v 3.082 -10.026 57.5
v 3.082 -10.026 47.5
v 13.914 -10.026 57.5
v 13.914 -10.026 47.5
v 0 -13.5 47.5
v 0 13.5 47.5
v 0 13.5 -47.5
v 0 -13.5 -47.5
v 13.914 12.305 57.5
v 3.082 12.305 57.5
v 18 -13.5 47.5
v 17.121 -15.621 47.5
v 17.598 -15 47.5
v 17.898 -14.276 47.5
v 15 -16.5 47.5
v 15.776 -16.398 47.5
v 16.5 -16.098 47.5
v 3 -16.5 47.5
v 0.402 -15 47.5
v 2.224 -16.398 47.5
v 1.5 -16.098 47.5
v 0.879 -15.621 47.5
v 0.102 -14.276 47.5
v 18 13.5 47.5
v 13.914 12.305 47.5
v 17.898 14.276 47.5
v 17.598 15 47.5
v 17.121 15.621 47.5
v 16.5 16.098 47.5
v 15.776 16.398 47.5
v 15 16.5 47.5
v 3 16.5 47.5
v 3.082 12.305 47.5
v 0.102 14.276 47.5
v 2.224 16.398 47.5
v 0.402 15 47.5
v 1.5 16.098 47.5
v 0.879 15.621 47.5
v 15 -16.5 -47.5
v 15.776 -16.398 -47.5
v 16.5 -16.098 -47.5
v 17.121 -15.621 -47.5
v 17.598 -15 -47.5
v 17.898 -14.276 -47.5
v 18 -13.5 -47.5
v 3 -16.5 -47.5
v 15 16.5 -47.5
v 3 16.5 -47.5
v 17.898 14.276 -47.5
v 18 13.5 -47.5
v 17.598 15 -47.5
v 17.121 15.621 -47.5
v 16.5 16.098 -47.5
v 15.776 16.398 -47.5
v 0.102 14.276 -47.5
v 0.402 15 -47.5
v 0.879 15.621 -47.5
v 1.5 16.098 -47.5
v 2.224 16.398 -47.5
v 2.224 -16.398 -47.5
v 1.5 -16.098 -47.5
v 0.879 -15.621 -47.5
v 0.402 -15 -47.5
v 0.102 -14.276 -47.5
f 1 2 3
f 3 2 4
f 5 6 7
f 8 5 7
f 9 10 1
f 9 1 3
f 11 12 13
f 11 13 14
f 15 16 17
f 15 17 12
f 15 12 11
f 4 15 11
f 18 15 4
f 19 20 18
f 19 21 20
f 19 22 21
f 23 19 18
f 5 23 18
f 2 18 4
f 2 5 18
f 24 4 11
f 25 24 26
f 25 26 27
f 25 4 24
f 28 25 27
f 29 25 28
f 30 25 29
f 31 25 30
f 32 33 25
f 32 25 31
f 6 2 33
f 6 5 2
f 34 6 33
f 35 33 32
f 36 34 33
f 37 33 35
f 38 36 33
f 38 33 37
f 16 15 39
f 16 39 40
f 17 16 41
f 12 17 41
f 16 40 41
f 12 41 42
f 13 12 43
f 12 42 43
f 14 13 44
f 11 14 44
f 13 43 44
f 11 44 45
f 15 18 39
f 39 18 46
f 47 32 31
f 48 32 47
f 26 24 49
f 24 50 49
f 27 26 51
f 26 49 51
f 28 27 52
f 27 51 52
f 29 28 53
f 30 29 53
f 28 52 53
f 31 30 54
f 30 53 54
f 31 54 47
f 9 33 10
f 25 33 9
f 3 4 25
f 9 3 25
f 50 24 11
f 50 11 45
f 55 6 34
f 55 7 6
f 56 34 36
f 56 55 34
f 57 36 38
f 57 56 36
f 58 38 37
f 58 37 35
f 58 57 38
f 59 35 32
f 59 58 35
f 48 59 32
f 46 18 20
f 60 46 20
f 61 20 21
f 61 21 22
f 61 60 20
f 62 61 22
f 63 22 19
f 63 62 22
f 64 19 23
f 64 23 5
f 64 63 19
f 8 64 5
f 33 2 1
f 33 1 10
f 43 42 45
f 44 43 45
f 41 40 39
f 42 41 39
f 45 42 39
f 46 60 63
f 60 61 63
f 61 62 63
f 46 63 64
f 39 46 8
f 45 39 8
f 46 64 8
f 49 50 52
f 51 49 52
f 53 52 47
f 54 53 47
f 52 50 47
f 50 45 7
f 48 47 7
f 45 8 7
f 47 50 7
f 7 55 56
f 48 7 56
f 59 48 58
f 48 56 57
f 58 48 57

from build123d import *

# Parameters (mm, degrees)
SKETCH1_W           = 95
SKETCH1_H           = 33
BOSS_EXTRUDE1_DEPTH = 18
SKETCH2_W           = 10.831848702
SKETCH2_H           = 22.331730537
BOSS_EXTRUDE2_DEPTH = 10
FILLET1_R           = 3


with BuildPart() as part:
    # Sketch1 → Boss-Extrude1 (new body)
    with BuildSketch(Plane(origin=(0, 0, 0), x_dir=(0, 0, -1), z_dir=(1, 0, 0))):
        Rectangle(SKETCH1_W, SKETCH1_H)
    extrude(amount=BOSS_EXTRUDE1_DEPTH)

    # Sketch2 → Boss-Extrude2 (add)
    with BuildSketch(Plane.XY.offset(47.5)):
        with Locations((8.498326505, 1.139612194)):
            Rectangle(SKETCH2_W, SKETCH2_H)
    extrude(amount=BOSS_EXTRUDE2_DEPTH)

    # Fillet1
    fillet1_edges = [part.edges().sort_by_distance(p)[0] for p in [
        (18, -16.5, 0),
        (0, -16.5, 0),
        (0, 16.5, 0),
        (18, 16.5, 0),
    ]]
    fillet(fillet1_edges, radius=FILLET1_R)


solid = part.part
